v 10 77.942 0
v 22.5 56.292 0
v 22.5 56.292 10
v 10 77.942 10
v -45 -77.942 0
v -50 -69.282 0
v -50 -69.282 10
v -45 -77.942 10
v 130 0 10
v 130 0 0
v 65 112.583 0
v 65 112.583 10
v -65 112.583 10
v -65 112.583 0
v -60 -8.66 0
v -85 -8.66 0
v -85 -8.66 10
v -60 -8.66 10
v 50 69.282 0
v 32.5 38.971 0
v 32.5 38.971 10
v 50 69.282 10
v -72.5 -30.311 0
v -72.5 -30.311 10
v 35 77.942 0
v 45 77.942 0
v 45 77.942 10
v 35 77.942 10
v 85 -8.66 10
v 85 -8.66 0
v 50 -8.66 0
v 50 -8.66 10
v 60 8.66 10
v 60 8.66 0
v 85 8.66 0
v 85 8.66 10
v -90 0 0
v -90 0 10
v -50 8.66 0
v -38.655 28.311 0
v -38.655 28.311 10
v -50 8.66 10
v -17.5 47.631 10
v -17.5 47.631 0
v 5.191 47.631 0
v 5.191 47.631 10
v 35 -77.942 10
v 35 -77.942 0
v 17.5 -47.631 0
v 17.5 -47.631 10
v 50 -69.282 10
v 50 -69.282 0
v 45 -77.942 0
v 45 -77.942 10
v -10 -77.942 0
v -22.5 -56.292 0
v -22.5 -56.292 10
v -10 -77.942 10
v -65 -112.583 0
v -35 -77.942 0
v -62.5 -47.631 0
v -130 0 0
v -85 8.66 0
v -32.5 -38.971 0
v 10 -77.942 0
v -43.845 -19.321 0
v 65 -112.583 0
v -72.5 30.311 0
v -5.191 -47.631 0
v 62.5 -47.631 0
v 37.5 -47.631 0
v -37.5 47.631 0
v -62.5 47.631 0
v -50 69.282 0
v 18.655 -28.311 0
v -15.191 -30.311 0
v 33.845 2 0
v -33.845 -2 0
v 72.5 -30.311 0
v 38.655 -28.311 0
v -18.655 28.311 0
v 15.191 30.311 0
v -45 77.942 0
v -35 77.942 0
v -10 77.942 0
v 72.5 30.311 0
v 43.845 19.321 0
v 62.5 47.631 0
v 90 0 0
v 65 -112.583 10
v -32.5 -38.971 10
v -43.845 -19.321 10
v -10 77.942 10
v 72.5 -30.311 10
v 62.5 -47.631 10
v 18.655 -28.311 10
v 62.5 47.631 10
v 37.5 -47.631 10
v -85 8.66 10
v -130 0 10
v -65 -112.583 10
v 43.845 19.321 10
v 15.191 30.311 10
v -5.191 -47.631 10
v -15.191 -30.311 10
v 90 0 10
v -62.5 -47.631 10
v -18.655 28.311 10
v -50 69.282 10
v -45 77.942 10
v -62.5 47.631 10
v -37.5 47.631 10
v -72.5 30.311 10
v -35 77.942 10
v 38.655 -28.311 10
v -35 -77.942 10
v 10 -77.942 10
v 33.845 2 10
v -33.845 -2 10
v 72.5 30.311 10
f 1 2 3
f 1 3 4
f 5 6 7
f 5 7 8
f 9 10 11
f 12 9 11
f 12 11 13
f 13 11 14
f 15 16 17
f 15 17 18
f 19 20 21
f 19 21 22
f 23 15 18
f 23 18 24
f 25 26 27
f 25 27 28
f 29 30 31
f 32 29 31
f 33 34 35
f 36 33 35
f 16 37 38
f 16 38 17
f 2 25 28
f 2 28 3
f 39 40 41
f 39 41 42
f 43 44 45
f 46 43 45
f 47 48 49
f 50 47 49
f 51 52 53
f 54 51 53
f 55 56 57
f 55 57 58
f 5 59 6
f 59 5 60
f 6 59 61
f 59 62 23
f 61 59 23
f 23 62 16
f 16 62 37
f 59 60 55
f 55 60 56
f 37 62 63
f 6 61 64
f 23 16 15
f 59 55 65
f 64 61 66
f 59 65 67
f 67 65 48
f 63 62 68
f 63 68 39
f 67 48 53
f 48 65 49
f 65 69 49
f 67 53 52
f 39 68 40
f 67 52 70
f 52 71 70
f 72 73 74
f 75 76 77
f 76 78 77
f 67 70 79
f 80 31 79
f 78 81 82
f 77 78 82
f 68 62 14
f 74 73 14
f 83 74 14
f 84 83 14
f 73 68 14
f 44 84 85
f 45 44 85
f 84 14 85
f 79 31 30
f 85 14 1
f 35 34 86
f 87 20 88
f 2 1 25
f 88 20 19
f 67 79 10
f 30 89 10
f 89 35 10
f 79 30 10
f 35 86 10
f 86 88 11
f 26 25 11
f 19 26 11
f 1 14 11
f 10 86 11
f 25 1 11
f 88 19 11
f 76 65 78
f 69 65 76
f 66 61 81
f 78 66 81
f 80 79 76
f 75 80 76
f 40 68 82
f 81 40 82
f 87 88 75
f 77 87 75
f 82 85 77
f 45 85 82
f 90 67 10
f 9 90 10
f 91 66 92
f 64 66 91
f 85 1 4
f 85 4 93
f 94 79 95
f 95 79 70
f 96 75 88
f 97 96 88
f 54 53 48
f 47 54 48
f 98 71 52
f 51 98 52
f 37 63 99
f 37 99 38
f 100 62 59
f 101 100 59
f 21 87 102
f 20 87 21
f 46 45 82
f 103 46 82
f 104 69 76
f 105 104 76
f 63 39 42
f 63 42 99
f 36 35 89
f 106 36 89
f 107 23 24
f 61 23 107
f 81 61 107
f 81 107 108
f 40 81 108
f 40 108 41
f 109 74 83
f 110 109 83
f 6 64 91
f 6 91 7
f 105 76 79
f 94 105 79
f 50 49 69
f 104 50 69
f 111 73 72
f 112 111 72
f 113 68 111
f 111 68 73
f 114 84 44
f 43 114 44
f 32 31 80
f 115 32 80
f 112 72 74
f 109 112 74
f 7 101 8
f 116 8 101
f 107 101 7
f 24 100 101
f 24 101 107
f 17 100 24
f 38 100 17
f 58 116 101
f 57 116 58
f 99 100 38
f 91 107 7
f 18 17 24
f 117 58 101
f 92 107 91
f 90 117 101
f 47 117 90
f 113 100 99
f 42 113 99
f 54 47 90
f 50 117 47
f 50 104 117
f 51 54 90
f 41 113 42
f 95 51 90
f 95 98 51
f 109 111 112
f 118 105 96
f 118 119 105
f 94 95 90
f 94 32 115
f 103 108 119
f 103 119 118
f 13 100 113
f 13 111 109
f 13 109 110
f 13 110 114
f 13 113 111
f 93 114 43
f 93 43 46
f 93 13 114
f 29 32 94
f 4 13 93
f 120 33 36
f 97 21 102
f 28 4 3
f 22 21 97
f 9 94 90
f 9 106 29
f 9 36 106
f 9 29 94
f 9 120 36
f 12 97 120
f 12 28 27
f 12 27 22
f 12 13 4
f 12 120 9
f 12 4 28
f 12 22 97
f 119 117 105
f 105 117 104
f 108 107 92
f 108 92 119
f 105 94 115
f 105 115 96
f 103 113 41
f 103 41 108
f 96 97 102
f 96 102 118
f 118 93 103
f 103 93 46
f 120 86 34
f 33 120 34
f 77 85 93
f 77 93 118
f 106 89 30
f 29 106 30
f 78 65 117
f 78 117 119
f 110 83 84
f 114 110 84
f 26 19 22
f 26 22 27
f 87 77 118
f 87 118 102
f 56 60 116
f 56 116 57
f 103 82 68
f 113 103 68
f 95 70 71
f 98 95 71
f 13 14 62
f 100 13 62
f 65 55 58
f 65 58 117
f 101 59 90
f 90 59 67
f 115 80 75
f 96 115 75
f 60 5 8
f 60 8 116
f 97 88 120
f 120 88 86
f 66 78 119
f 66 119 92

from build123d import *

# Parameters (mm, degrees)
PAD_DEPTH = 10


with BuildPart() as part:
    # Sketch → Pad (new body)
    with BuildSketch(Plane.XY):
        Polygon((130, 0), (65, 112.583302), (-65, 112.583302), (-130, 0), (-65, -112.583302), (65, -112.583302), align=None)
        Polygon((35, 77.942286), (22.5, 56.291651), (10, 77.942286), (-10, 77.942286), (33.845299, 2), (43.845299, 19.320508), (32.5, 38.971143), (50, 69.282032), (45, 77.942286), align=None, mode=Mode.SUBTRACT)
        Polygon((85, -8.660254), (50, -8.660254), (38.654701, -28.310889), (18.654701, -28.310889), (62.5, 47.631397), (72.5, 30.310889), (60, 8.660254), (85, 8.660254), (90, 0), align=None, mode=Mode.SUBTRACT)
        Polygon((35, -77.942286), (17.5, -47.631397), (-5.190599, -47.631397), (-15.190599, -30.310889), (72.5, -30.310889), (62.5, -47.631397), (37.5, -47.631397), (50, -69.282032), (45, -77.942286), align=None, mode=Mode.SUBTRACT)
        Polygon((-85, -8.660254), (-60, -8.660254), (-72.5, -30.310889), (-62.5, -47.631397), (-18.654701, 28.310889), (-38.654701, 28.310889), (-50, 8.660254), (-85, 8.660254), (-90, 0), align=None, mode=Mode.SUBTRACT)
        Polygon((-50, 69.282032), (-45, 77.942286), (-35, 77.942286), (-17.5, 47.631397), (5.190599, 47.631397), (15.190599, 30.310889), (-72.5, 30.310889), (-62.5, 47.631397), (-37.5, 47.631397), align=None, mode=Mode.SUBTRACT)
        Polygon((-35, -77.942286), (-22.5, -56.291651), (-10, -77.942286), (10, -77.942286), (-33.845299, -2), (-43.845299, -19.320508), (-32.5, -38.971143), (-50, -69.282032), (-45, -77.942286), align=None, mode=Mode.SUBTRACT)
    extrude(amount=PAD_DEPTH)


solid = part.part
